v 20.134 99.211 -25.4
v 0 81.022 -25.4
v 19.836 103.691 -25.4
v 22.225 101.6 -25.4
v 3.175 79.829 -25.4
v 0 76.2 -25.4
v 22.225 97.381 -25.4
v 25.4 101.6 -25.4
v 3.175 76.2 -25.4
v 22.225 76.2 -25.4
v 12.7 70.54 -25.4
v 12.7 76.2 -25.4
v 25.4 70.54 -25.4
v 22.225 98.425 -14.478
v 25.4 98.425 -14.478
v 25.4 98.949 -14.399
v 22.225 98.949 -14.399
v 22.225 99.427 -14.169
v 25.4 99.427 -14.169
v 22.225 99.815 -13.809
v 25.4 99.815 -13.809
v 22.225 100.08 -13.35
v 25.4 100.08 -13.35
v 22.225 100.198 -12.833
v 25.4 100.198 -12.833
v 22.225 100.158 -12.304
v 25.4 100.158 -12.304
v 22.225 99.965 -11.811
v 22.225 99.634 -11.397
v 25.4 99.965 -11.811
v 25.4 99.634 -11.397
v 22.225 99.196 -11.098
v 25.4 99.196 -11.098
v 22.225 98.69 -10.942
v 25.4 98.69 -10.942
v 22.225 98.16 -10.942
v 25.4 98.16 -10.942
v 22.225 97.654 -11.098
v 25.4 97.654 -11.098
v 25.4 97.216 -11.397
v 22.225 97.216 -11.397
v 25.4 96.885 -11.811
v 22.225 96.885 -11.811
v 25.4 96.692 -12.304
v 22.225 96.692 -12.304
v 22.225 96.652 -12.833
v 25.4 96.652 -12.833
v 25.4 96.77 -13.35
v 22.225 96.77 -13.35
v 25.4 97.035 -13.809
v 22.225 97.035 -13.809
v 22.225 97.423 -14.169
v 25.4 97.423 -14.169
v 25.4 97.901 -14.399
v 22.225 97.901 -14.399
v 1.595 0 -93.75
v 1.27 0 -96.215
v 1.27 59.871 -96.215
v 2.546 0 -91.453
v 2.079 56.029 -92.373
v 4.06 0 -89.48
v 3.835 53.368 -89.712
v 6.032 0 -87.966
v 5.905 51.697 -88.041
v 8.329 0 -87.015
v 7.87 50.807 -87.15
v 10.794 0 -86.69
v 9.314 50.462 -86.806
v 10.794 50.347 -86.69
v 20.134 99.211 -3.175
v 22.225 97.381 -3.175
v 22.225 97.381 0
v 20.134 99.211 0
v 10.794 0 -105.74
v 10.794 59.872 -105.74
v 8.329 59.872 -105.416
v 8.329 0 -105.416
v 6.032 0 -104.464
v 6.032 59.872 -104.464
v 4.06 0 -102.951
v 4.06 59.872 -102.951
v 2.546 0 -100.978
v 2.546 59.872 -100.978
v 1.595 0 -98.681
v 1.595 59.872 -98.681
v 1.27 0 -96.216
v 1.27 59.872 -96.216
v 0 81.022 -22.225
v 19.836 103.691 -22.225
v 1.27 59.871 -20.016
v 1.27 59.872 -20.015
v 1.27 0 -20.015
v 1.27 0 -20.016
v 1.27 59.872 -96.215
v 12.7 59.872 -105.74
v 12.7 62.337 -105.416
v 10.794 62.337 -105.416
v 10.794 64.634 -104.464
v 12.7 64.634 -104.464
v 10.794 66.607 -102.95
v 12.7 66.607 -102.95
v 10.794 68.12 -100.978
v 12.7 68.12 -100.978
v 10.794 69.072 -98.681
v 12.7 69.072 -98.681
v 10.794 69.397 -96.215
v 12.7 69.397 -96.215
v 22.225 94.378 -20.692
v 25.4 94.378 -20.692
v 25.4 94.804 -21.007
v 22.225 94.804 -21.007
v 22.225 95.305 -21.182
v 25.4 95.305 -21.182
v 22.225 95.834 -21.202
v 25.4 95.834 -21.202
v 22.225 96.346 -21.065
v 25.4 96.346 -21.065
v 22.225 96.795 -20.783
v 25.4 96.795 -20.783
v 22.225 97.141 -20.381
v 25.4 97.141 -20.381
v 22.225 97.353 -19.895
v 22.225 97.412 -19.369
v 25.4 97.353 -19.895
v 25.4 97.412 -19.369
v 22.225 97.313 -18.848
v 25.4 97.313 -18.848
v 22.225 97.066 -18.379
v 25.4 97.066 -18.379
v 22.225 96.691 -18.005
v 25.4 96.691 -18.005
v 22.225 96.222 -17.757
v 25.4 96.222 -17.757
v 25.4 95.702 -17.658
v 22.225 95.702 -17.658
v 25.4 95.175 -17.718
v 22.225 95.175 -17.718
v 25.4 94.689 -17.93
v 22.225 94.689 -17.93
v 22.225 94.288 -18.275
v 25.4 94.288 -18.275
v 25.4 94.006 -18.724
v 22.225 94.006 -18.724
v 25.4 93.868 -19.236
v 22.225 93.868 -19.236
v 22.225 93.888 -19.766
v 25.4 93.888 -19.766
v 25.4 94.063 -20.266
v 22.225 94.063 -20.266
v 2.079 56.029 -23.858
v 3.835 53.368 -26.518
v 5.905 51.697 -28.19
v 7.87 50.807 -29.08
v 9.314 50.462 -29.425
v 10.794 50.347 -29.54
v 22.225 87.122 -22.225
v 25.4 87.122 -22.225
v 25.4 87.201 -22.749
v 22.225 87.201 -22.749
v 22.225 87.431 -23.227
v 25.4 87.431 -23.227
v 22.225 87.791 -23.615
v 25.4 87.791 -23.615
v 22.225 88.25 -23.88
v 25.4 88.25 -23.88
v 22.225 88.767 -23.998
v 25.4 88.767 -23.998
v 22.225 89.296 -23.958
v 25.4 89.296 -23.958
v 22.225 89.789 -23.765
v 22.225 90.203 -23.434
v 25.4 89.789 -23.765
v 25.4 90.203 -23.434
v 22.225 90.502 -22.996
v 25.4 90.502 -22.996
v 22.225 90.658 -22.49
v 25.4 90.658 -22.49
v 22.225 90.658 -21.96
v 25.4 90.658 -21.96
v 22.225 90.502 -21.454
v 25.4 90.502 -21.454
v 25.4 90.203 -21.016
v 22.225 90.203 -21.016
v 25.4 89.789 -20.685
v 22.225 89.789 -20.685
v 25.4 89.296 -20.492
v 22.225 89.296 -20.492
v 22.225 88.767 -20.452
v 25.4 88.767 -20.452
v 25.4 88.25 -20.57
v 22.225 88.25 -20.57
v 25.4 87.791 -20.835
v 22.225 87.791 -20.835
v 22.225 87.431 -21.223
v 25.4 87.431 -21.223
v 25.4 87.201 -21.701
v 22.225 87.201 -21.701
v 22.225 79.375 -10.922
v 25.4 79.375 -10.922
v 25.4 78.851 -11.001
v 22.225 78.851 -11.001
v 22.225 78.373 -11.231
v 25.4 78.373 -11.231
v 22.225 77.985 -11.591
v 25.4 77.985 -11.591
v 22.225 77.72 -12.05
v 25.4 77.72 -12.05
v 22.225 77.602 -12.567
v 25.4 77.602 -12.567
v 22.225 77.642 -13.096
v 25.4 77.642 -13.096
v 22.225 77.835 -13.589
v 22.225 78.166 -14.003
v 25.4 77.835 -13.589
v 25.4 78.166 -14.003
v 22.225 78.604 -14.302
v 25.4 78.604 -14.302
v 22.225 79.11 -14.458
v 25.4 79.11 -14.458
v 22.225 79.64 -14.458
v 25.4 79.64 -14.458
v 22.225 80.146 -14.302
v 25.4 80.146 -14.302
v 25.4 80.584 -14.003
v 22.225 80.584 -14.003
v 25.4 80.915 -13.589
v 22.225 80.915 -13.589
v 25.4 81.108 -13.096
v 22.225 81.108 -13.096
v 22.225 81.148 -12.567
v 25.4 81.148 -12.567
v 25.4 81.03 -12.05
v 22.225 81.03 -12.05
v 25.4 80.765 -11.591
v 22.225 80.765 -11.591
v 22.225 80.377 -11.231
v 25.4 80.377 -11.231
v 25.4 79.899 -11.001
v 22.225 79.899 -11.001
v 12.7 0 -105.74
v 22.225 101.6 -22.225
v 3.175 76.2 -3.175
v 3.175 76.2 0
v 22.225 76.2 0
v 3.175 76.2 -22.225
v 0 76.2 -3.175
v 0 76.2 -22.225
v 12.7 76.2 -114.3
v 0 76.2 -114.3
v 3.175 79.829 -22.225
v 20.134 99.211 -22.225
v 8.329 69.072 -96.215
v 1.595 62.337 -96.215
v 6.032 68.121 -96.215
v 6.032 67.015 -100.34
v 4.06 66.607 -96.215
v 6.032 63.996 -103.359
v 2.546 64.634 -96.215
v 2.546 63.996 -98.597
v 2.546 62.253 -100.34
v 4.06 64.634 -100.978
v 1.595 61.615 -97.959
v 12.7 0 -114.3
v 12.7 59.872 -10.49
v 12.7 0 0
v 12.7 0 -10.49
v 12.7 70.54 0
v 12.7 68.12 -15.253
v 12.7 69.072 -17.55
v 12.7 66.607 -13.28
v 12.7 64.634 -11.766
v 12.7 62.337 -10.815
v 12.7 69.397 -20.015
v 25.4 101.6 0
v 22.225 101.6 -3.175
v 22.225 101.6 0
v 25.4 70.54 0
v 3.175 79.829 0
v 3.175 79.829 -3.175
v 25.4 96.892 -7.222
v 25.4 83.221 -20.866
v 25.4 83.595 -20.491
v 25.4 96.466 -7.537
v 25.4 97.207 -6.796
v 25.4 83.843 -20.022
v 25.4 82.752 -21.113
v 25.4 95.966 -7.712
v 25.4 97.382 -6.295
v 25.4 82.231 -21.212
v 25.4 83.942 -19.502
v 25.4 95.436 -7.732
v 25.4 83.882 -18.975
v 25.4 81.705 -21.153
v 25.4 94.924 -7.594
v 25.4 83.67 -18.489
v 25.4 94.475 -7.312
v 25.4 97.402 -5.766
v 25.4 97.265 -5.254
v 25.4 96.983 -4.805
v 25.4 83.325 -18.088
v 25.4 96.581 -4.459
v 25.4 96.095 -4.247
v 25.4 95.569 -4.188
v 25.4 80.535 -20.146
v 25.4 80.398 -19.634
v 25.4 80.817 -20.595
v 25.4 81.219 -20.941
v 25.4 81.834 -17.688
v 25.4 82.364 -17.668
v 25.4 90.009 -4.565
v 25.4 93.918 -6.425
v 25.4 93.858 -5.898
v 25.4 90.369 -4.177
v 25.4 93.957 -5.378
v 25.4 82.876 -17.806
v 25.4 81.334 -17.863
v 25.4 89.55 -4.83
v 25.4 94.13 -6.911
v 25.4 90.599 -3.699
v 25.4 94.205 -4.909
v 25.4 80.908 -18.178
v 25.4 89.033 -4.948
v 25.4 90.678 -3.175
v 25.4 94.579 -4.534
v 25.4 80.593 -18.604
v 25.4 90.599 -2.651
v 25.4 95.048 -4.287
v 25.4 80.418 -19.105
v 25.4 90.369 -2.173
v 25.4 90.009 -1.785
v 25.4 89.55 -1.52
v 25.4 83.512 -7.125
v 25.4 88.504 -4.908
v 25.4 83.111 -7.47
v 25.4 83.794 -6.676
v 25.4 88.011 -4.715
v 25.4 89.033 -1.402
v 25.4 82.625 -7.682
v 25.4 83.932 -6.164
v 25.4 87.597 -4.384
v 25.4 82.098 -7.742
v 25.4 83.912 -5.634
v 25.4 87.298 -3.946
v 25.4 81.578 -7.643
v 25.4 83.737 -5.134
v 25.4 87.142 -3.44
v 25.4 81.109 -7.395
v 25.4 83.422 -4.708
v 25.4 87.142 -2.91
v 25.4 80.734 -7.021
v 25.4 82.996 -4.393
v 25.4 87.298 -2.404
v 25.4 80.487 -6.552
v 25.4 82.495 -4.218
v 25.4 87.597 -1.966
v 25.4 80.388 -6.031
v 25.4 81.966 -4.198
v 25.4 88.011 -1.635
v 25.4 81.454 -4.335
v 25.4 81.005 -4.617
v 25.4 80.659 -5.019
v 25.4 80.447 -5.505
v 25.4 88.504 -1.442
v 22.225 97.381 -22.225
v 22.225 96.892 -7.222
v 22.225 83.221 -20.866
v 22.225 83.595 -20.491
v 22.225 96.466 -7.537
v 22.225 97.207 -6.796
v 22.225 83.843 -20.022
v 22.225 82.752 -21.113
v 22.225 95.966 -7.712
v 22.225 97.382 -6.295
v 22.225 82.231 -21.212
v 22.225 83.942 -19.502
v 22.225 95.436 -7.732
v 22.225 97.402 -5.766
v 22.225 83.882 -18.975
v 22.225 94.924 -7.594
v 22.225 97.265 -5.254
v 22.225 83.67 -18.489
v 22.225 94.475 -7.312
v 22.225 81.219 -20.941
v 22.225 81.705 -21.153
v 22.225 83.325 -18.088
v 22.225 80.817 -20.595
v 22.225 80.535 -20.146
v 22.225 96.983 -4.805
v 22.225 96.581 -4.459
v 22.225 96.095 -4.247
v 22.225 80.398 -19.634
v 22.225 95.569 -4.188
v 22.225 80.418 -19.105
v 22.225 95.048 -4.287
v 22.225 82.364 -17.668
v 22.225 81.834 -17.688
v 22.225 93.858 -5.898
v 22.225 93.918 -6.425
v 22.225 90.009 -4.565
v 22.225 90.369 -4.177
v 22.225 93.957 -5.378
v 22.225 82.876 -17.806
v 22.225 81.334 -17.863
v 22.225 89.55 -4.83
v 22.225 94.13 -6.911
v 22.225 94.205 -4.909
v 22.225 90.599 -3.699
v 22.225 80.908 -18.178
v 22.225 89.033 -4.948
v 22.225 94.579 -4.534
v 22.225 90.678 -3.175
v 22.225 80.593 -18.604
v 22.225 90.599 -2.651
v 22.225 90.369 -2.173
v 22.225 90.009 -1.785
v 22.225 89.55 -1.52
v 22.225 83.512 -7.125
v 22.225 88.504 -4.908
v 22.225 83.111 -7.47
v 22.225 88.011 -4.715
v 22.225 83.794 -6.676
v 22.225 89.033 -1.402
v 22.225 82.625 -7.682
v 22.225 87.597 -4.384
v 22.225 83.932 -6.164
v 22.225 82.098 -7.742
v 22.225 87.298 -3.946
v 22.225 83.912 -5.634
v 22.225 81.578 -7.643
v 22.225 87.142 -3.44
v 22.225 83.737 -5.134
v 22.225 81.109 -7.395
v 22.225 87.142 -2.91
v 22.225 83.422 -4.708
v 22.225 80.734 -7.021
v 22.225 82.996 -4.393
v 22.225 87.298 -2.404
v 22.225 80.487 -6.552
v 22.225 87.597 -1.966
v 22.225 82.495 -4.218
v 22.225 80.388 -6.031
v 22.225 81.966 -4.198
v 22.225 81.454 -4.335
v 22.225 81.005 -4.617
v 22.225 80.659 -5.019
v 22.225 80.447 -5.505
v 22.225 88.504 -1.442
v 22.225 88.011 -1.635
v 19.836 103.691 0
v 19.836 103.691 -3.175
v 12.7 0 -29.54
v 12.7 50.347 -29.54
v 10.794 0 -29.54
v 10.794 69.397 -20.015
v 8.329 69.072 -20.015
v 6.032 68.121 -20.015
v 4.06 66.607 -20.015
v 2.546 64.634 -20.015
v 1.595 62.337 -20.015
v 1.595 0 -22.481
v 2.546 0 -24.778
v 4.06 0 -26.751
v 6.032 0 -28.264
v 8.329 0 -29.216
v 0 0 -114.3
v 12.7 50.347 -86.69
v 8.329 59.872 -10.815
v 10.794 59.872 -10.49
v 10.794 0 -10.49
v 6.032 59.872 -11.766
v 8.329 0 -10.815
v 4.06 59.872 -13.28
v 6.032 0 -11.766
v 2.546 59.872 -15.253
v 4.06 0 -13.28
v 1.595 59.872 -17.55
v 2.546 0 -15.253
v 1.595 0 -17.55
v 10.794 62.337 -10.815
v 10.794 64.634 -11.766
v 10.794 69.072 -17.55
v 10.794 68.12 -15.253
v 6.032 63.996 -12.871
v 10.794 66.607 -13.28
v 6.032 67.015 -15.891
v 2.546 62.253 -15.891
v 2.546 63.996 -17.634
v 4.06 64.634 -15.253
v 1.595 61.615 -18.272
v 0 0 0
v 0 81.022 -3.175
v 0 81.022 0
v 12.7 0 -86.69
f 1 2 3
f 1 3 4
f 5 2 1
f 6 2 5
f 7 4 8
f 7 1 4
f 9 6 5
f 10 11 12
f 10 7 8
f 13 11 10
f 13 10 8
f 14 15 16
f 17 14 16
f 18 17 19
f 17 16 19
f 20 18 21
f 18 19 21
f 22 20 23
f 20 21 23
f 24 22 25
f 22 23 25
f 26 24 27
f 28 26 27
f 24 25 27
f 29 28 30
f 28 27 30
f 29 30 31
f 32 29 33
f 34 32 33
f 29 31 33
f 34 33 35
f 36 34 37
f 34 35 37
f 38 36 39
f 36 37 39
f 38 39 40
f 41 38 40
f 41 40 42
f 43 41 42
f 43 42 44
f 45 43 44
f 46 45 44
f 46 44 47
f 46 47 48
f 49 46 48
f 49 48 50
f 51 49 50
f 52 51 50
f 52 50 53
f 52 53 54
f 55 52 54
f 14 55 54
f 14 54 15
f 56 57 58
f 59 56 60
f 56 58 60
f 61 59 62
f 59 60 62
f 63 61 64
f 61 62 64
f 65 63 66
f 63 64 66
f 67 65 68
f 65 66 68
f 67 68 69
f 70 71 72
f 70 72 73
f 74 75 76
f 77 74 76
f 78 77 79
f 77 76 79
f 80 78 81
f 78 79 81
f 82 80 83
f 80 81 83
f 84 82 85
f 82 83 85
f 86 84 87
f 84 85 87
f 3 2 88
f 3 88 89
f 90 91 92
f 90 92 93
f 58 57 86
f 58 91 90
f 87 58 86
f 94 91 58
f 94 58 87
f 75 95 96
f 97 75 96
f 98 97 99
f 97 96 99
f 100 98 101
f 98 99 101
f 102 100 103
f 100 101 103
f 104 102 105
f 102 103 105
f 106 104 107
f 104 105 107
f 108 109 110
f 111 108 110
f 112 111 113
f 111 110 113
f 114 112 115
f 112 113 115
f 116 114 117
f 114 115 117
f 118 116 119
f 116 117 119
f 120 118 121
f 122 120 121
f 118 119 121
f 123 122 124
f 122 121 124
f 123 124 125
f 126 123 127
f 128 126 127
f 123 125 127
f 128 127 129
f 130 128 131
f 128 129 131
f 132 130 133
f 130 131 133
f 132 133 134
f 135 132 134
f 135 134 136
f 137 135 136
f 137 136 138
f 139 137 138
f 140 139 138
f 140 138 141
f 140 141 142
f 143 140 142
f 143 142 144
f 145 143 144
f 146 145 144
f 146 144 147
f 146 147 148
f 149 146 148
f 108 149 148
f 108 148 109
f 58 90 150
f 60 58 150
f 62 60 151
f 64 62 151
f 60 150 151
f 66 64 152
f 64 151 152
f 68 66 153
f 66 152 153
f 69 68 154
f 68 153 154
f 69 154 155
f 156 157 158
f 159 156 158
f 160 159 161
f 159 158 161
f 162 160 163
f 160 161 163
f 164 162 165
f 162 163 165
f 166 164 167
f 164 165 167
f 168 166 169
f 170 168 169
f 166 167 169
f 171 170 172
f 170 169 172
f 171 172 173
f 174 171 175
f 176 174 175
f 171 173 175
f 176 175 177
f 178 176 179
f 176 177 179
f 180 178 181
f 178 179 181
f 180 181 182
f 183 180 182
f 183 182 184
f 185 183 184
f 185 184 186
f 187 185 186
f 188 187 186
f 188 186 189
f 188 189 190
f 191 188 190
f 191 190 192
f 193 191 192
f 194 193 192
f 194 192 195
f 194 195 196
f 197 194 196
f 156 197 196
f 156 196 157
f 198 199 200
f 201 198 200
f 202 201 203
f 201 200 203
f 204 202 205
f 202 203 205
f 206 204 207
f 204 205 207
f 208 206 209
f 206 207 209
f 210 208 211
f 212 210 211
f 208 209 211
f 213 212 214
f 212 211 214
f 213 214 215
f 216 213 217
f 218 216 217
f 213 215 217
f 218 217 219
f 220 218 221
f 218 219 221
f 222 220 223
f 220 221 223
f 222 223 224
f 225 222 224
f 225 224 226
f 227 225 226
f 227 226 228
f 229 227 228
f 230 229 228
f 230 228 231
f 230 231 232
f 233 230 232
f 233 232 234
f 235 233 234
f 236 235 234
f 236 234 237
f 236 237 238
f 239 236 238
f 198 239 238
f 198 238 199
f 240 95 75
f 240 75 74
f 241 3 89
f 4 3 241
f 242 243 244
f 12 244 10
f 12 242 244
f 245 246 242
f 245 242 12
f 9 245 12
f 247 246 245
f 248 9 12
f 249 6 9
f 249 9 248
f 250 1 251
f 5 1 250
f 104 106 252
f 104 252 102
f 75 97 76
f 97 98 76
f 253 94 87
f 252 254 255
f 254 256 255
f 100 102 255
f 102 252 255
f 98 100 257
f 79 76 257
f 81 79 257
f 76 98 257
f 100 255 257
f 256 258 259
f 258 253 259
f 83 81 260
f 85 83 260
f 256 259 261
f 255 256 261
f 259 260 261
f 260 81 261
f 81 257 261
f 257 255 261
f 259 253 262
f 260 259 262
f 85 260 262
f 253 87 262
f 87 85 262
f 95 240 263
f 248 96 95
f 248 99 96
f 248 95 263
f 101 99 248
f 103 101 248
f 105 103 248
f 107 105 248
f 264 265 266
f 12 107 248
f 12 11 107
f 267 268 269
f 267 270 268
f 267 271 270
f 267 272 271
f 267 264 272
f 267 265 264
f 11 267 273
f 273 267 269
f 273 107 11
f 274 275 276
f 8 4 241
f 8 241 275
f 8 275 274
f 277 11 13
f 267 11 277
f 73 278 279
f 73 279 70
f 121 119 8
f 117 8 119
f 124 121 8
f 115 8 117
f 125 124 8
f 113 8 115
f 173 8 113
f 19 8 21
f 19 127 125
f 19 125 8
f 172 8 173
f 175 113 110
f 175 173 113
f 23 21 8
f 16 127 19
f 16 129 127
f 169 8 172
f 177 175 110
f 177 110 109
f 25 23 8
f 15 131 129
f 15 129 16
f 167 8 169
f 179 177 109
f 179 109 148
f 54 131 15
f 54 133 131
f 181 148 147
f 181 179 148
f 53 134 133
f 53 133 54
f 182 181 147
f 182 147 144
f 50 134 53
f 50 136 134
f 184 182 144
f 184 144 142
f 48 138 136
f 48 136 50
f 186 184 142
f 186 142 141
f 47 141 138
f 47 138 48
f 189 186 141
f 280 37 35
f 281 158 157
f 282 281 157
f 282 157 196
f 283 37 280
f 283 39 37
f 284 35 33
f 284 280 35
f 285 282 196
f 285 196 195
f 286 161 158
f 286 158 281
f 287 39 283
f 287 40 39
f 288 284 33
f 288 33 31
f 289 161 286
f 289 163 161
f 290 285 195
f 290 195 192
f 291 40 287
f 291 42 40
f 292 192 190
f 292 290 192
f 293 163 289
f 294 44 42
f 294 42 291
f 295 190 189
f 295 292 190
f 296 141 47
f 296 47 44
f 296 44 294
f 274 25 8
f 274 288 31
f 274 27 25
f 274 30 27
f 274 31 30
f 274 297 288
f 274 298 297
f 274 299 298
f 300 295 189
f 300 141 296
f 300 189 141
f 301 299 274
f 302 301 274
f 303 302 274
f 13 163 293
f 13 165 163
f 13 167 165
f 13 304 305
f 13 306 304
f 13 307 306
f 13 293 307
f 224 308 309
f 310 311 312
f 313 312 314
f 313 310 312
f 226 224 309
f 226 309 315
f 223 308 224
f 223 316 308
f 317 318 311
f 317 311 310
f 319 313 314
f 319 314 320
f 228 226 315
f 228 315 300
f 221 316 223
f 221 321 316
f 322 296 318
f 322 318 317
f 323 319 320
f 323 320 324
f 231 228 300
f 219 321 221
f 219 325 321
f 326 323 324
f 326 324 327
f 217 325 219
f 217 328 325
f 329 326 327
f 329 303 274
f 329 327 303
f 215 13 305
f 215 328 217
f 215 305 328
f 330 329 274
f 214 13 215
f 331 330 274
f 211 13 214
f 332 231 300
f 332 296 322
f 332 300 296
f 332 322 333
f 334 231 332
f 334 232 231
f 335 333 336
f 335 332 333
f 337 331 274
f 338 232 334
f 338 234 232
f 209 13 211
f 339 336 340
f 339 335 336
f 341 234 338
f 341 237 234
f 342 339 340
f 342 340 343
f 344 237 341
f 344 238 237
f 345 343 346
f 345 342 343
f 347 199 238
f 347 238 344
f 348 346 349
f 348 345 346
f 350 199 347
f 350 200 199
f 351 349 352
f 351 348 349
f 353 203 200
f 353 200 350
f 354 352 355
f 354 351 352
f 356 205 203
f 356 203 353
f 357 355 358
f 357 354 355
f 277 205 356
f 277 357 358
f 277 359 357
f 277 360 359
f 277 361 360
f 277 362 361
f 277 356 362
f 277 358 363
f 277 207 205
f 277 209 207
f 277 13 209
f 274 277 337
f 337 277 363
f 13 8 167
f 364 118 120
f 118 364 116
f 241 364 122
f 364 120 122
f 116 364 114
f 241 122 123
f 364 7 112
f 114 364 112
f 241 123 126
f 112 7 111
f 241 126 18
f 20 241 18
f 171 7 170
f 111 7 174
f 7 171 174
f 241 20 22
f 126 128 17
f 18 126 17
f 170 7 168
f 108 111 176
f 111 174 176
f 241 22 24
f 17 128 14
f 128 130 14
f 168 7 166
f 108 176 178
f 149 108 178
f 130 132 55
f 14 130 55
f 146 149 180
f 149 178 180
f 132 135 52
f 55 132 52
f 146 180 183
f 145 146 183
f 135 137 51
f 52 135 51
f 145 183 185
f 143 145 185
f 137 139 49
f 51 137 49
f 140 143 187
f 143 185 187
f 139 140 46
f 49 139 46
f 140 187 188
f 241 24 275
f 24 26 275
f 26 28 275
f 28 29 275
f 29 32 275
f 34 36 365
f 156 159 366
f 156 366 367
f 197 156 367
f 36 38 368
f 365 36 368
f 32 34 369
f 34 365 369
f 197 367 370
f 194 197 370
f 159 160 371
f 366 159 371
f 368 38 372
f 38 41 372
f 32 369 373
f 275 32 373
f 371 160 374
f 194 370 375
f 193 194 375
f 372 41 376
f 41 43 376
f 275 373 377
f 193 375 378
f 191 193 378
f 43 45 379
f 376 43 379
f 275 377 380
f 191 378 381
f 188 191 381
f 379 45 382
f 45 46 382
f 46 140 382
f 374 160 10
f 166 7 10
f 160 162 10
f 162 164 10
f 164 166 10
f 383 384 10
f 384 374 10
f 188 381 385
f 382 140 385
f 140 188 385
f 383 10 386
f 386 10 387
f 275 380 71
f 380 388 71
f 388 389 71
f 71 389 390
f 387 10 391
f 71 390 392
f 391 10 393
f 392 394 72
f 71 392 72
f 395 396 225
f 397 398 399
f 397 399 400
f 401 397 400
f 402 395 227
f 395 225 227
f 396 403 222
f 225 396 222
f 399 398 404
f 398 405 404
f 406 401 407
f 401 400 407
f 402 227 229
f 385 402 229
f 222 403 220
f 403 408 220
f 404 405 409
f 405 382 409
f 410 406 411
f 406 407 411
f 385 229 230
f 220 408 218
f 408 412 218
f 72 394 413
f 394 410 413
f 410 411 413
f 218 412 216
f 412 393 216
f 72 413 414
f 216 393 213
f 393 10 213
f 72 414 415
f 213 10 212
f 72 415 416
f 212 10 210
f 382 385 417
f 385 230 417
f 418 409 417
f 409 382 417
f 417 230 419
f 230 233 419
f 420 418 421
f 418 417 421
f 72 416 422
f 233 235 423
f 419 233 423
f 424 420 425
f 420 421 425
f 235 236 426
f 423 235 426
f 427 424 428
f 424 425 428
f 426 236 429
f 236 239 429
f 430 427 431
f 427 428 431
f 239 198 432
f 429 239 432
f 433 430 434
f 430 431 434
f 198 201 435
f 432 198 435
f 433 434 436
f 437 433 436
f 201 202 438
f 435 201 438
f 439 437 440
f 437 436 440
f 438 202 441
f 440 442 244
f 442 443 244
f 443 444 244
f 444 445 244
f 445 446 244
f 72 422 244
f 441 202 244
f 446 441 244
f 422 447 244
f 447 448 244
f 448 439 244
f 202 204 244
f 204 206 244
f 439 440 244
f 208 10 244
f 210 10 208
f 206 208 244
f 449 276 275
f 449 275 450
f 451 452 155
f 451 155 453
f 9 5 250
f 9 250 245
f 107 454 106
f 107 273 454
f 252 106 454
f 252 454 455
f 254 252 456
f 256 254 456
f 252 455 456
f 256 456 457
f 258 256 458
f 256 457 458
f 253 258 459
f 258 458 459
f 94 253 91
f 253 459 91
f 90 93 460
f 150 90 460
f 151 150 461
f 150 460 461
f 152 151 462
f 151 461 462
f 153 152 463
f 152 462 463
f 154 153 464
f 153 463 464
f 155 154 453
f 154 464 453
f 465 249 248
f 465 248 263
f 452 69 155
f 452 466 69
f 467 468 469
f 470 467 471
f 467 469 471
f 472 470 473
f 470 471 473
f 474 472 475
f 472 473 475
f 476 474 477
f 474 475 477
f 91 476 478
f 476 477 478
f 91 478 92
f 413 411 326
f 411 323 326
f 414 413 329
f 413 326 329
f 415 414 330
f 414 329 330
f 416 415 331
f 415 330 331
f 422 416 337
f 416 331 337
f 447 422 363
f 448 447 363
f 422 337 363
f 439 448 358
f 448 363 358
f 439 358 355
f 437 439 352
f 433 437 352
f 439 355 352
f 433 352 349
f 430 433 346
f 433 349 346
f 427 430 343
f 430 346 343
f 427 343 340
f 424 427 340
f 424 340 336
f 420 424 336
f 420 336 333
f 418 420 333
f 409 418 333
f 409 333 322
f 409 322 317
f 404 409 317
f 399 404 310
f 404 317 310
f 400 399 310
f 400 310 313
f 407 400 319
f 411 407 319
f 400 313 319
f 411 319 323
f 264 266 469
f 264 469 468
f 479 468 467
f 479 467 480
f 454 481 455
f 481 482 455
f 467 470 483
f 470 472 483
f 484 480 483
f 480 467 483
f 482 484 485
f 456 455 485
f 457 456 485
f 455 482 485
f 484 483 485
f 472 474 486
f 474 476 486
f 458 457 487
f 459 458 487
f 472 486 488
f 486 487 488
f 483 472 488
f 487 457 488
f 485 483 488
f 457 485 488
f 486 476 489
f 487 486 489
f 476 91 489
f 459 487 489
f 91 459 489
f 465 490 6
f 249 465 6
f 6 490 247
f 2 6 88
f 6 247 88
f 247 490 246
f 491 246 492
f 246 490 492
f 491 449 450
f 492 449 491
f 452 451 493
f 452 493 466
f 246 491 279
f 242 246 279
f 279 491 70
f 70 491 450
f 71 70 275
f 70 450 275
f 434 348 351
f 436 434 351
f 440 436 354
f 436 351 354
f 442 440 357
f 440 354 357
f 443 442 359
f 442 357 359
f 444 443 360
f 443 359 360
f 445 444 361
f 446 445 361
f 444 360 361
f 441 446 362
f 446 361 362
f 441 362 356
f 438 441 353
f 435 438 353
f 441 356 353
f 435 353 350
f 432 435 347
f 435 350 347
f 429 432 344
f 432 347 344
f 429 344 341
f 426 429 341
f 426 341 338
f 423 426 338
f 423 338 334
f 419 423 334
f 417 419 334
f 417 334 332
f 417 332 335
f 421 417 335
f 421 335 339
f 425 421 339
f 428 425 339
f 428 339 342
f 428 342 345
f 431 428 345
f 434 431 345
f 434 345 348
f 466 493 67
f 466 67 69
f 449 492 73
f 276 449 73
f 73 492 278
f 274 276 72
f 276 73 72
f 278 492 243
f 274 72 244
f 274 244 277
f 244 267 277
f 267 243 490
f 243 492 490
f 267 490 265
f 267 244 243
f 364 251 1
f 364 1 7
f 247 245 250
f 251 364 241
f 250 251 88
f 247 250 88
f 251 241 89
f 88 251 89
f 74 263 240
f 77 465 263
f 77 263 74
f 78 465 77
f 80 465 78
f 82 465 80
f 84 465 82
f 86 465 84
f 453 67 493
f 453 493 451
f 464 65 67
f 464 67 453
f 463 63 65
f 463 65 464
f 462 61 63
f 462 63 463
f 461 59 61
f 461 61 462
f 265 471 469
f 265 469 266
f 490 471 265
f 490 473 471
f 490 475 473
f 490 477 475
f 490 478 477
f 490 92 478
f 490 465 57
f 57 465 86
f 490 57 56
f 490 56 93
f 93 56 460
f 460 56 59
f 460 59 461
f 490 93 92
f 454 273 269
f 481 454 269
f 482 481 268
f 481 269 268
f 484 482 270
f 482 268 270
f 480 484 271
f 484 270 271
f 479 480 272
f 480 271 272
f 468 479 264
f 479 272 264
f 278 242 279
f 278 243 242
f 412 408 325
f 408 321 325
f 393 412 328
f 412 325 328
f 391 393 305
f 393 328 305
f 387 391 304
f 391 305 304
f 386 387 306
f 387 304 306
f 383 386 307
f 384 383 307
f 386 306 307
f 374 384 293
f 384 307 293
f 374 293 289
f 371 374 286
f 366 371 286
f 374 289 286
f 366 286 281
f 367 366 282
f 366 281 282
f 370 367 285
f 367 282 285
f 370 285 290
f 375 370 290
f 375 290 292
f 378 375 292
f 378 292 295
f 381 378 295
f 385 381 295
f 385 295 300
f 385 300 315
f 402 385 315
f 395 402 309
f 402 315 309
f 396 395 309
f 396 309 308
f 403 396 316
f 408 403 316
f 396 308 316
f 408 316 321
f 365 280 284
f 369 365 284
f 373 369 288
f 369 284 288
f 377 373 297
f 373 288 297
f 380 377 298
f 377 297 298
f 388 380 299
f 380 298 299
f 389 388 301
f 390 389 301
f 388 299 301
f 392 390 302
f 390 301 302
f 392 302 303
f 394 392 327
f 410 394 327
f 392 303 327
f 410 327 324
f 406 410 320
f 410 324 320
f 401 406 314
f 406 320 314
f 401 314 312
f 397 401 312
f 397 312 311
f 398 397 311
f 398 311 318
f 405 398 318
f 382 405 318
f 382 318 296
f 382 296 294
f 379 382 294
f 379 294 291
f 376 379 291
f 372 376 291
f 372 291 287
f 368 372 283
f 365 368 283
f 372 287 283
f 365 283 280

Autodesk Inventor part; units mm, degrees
ref_plane "YZ Plane" through (0, 0, 0) normal (1, 0, 0) x (0, 1, 0)
ref_plane "XZ Plane" through (0, 0, 0) normal (0, 1, 0) x (-1, 0, 0)
sketch "Sketch1" plane through (0, 0, 0) normal (1, 0, 0) x (0, 1, 0)
  line L0 (0, 0) -> (76.2, 0)
  line L1 (76.2, 0) -> (76.2, -114.3)
  line L2 (76.2, -114.3) -> (0, -114.3)
  line L3 (0, -114.3) -> (0, 0)
  dimension "d0" = 76.2
  dimension "d1" = 114.3
extrude "Extrusion1" add sketch "Sketch1" along normal blind 12.7
sketch "Sketch2" plane through (12.7, 0, 0) normal (1, 0, 0) x (0, 0, -1)
  line L0 (0, 76.2) -> (0, 0) projected
  line L1 (0, 76.2) -> (25.4, 76.2)
  line L2 (25.4, 76.2) -> (25.4, 70.5404)
  line L3 (25.4, 70.5404) -> (0, 70.5404)
  line L4 (0, 70.5404) -> (0, 76.2)
  dimension "d4" = 25.4
extrude "Extrusion2" add sketch "Sketch2" along normal blind 12.7
sketch "Sketch3" plane through (0, 76.2, 0) normal (0, 1, 0) x (1, 0, 0)
  line L0 (0, 0) -> (0, 114.3) projected
  line L1 (0, 0) -> (25.4, 0) projected
  line L2 (25.4, 25.4) -> (25.4, 0) projected
  line L3 (12.7, 25.4) -> (25.4, 25.4) projected
  line L4 (12.7, 114.3) -> (12.7, 25.4) projected
  line L5 (0, 114.3) -> (12.7, 114.3) projected
  line L6 (12.7, 25.4) -> (25.4, 25.4) projected
  line L7 (22.225, 25.4) -> (22.225, 0)
  line L8 (0, 0) -> (25.4, 0) projected
  dimension "d8" = 3.175
extrude "Extrusion3" add sketch "Sketch3" along normal blind 25.4 contours L7 L3 L2 L1
sketch "Sketch4" plane through (0, 0, 0) normal (0, 0, 1) x (1, 0, 0)
  line L0 (0, 76.2) -> (22.225, 76.2) projected
  line L1 (0, 76.2) -> (22.225, 101.6)
  line L2 (22.225, 101.6) -> (19.8356, 103.6908)
  line L3 (19.8356, 103.6908) -> (0, 81.0215)
  line L4 (22.225, 101.6) -> (25.4, 101.6) projected
  line L5 (22.225, 76.2) -> (22.225, 101.6) projected
  line L6 (0, 76.2) -> (0, 81.0215)
  line L7 (22.225, 97.3812) -> (20.1342, 99.2106)
  line L8 (3.175, 76.2) -> (3.175, 79.8286)
  point P0 (0, 0)
  dimension "d11" = 3.175
  dimension "d12" = 3.175
  dimension "d13" = 3.175
extrude "Extrusion4" add sketch "Sketch4" against normal blind 3.175 contours L1 L8 L0 | L6 L3 L2 L1 | L1 L5 L7
ref_plane "Work Plane1" through (12.7, 70.5404, -12.7) normal (0, 0, -1) x (-1, 0, 0)
mirror "Mirror1" about plane through (12.7, 70.5404, -12.7) normal (0, 0, -1) of "Extrusion4"
sketch "Sketch5" plane through (25.4, 0, 0) normal (1, 0, 0) x (0, 0, -1)
  line L0 (0, 70.5404) -> (0, 101.6) projected
  line L1 (0, 70.5404) -> (25.4, 70.5404) projected
  line L2 (25.4, 70.5404) -> (25.4, 101.6) projected
  line L3 (0, 101.6) -> (25.4, 101.6) projected
  circle A0 centre (12.7, 88.9) radius 6.35
  line L4 (0, 76.2) -> (25.4, 76.2) projected
  circle A1 centre (12.7, 98.425) radius 1.778
  point P0 (0, 0)
  dimension "d16" = 12.7
  dimension "d17" = 25.4
  dimension "d18" = 25.4
  dimension "d19" = 12.7
  dimension "d20" = 12.7
  dimension "d21" = 3.556
  dimension "d22" = 9.525
extrude "Extrusion5" cut sketch "Sketch5" against normal blind 3.175 contours A1
pattern_circular "Circular Pattern1" count 8 over 360 about axis through (25.4, 88.9, -12.7) along (1, 0, 0) of "Extrusion5"
sketch "Sketch6" plane through (0, 0, 0) normal (-1, 0, 0) x (0, 0, 1)
  line L0 (0, 0) -> (-114.3, 0) projected
  line L1 (-20.0153, 0) -> (-20.0153, 59.8716) construction
  line L2 (-10.4903, 0) -> (-10.4903, 59.8716)
  line L3 (-29.5403, 59.8716) -> (-29.5403, 0)
  arc A0 (-29.5403, 0) -> (-10.4903, 0) centre (-20.0153, 0) ccw
  arc A1 (-10.4903, 59.8716) -> (-29.5403, 59.8716) centre (-20.0153, 59.8716) ccw
  line L4 (-20.0153, 59.8716) -> (-96.2153, 59.8716) construction
  line L5 (-20.0153, 69.3966) -> (-96.2153, 69.3966)
  line L6 (-96.2153, 50.3466) -> (-20.0153, 50.3466)
  arc A2 (-20.0153, 50.3466) -> (-20.0153, 69.3966) centre (-20.0153, 59.8716) ccw
  arc A3 (-96.2153, 69.3966) -> (-96.2153, 50.3466) centre (-96.2153, 59.8716) ccw
  line L7 (-96.2153, 59.8716) -> (-96.2153, 0) construction
  line L8 (-105.7403, 59.8716) -> (-105.7403, 0)
  line L9 (-86.6903, 0) -> (-86.6903, 59.8716)
  arc A4 (-86.6903, 59.8716) -> (-105.7403, 59.8716) centre (-96.2153, 59.8716) ccw
  arc A5 (-105.7403, 0) -> (-86.6903, 0) centre (-96.2153, 0) ccw
  line L10 (-114.3, 0) -> (-114.3, 76.2) projected
  line L11 (0, 0) -> (0, 81.0215) projected
  point P0 (-20.0153, 29.9358)
  point P1 (-58.1153, 59.8716)
  point P2 (-96.2153, 29.9358)
  dimension "d28" = 19.05
  dimension "d29" = 76.2
  dimension "d30" = 19.05
  dimension "d31" = 19.05
  dimension "d32" = 95.25
  dimension "d36" = 116.2307
  dimension "d37" = 10.4903
sketch "Sketch7" plane through (12.7, 0, 0) normal (1, 0, 0) x (0, 0, -1)
  line L0 (25.4, 70.5404) -> (0, 70.5404) projected
  line L1 (0, 70.5404) -> (0, 0) projected
  line L2 (0, 0) -> (114.3, 0) construction
  line L3 (114.3, 0) -> (114.3, 76.2) projected
  line L4 (114.3, 76.2) -> (25.4, 76.2) projected
  line L5 (25.4, 76.2) -> (25.4, 70.5404) projected
  line L6 (105.7403, 59.8716) -> (105.7403, 0) projected
  line L7 (20.0153, 69.3966) -> (96.2153, 69.3966) projected
  line L8 (0, 0) -> (0, 81.0215) projected
  line L9 (0, 81.0215) -> (3.175, 81.0215) projected
  line L10 (3.175, 76.2) -> (3.175, 81.0215) projected
  line L11 (3.175, 76.2) -> (22.225, 76.2) projected
  line L12 (22.225, 76.2) -> (22.225, 81.0215) projected
  line L13 (25.4, 81.0215) -> (22.225, 81.0215) projected
  line L14 (25.4, 81.0215) -> (25.4, 76.2) projected
  line L15 (25.4, 76.2) -> (114.3, 76.2) projected
  line L16 (114.3, 76.2) -> (114.3, 0) projected
  line L17 (114.3, 0) -> (0, 0) projected
  arc A0 (105.7403, 59.8716) -> (86.6903, 59.8716) centre (96.2153, 59.8716) ccw projected
  arc A1 (96.2153, 50.3466) -> (96.2153, 69.3966) centre (96.2153, 59.8716) ccw projected
  line L18 (96.2153, 50.3466) -> (20.0153, 50.3466) projected
  line L19 (86.6903, 0) -> (86.6903, 59.8716) projected
  arc A2 (86.6903, 0) -> (105.7403, 0) centre (96.2153, 0) ccw projected
  arc A3 (10.4903, 0) -> (29.5403, 0) centre (20.0153, 0) ccw projected
  line L20 (29.5403, 59.8716) -> (29.5403, 0) projected
  line L21 (10.4903, 0) -> (10.4903, 59.8716) projected
  arc A4 (29.5403, 59.8716) -> (10.4903, 59.8716) centre (20.0153, 59.8716) ccw projected
  arc A5 (20.0153, 69.3966) -> (20.0153, 50.3466) centre (20.0153, 59.8716) ccw projected
extrude "Extrusion7" cut sketch "Sketch7" against normal blind 11.43 contours L21 A5 L18 L20 L17 | L17 A3 | A4 L20 L18 A5 | L17 L19 L18 A1 L6 | A2 L17 | L20 A4 L7 A0 L19 L18 | A1 L18 L19 A0
fillet "Fillet2" radius 9.525 7 edges at (1.27, 66.6068, -102.9505) (1.27, 29.9358, -105.7403) (1.27, 29.9358, -10.4903) (1.27, 69.3966, -58.1153) (1.27, 25.1733, -86.6903) (1.27, 50.3466, -58.1153) (1.27, 25.1733, -29.5403)
equation "\"d12\" = d13"
equation "\"d19\" = 0.5 * d18"
equation "\"d20\" = 0.5 * d17"
equation "\"d28\" = d31"
equation "\"d30\" = d31"
equation "\"d37\" = -0.5 * d32 + 0.5 * d36"
properties part number "relicmold"
